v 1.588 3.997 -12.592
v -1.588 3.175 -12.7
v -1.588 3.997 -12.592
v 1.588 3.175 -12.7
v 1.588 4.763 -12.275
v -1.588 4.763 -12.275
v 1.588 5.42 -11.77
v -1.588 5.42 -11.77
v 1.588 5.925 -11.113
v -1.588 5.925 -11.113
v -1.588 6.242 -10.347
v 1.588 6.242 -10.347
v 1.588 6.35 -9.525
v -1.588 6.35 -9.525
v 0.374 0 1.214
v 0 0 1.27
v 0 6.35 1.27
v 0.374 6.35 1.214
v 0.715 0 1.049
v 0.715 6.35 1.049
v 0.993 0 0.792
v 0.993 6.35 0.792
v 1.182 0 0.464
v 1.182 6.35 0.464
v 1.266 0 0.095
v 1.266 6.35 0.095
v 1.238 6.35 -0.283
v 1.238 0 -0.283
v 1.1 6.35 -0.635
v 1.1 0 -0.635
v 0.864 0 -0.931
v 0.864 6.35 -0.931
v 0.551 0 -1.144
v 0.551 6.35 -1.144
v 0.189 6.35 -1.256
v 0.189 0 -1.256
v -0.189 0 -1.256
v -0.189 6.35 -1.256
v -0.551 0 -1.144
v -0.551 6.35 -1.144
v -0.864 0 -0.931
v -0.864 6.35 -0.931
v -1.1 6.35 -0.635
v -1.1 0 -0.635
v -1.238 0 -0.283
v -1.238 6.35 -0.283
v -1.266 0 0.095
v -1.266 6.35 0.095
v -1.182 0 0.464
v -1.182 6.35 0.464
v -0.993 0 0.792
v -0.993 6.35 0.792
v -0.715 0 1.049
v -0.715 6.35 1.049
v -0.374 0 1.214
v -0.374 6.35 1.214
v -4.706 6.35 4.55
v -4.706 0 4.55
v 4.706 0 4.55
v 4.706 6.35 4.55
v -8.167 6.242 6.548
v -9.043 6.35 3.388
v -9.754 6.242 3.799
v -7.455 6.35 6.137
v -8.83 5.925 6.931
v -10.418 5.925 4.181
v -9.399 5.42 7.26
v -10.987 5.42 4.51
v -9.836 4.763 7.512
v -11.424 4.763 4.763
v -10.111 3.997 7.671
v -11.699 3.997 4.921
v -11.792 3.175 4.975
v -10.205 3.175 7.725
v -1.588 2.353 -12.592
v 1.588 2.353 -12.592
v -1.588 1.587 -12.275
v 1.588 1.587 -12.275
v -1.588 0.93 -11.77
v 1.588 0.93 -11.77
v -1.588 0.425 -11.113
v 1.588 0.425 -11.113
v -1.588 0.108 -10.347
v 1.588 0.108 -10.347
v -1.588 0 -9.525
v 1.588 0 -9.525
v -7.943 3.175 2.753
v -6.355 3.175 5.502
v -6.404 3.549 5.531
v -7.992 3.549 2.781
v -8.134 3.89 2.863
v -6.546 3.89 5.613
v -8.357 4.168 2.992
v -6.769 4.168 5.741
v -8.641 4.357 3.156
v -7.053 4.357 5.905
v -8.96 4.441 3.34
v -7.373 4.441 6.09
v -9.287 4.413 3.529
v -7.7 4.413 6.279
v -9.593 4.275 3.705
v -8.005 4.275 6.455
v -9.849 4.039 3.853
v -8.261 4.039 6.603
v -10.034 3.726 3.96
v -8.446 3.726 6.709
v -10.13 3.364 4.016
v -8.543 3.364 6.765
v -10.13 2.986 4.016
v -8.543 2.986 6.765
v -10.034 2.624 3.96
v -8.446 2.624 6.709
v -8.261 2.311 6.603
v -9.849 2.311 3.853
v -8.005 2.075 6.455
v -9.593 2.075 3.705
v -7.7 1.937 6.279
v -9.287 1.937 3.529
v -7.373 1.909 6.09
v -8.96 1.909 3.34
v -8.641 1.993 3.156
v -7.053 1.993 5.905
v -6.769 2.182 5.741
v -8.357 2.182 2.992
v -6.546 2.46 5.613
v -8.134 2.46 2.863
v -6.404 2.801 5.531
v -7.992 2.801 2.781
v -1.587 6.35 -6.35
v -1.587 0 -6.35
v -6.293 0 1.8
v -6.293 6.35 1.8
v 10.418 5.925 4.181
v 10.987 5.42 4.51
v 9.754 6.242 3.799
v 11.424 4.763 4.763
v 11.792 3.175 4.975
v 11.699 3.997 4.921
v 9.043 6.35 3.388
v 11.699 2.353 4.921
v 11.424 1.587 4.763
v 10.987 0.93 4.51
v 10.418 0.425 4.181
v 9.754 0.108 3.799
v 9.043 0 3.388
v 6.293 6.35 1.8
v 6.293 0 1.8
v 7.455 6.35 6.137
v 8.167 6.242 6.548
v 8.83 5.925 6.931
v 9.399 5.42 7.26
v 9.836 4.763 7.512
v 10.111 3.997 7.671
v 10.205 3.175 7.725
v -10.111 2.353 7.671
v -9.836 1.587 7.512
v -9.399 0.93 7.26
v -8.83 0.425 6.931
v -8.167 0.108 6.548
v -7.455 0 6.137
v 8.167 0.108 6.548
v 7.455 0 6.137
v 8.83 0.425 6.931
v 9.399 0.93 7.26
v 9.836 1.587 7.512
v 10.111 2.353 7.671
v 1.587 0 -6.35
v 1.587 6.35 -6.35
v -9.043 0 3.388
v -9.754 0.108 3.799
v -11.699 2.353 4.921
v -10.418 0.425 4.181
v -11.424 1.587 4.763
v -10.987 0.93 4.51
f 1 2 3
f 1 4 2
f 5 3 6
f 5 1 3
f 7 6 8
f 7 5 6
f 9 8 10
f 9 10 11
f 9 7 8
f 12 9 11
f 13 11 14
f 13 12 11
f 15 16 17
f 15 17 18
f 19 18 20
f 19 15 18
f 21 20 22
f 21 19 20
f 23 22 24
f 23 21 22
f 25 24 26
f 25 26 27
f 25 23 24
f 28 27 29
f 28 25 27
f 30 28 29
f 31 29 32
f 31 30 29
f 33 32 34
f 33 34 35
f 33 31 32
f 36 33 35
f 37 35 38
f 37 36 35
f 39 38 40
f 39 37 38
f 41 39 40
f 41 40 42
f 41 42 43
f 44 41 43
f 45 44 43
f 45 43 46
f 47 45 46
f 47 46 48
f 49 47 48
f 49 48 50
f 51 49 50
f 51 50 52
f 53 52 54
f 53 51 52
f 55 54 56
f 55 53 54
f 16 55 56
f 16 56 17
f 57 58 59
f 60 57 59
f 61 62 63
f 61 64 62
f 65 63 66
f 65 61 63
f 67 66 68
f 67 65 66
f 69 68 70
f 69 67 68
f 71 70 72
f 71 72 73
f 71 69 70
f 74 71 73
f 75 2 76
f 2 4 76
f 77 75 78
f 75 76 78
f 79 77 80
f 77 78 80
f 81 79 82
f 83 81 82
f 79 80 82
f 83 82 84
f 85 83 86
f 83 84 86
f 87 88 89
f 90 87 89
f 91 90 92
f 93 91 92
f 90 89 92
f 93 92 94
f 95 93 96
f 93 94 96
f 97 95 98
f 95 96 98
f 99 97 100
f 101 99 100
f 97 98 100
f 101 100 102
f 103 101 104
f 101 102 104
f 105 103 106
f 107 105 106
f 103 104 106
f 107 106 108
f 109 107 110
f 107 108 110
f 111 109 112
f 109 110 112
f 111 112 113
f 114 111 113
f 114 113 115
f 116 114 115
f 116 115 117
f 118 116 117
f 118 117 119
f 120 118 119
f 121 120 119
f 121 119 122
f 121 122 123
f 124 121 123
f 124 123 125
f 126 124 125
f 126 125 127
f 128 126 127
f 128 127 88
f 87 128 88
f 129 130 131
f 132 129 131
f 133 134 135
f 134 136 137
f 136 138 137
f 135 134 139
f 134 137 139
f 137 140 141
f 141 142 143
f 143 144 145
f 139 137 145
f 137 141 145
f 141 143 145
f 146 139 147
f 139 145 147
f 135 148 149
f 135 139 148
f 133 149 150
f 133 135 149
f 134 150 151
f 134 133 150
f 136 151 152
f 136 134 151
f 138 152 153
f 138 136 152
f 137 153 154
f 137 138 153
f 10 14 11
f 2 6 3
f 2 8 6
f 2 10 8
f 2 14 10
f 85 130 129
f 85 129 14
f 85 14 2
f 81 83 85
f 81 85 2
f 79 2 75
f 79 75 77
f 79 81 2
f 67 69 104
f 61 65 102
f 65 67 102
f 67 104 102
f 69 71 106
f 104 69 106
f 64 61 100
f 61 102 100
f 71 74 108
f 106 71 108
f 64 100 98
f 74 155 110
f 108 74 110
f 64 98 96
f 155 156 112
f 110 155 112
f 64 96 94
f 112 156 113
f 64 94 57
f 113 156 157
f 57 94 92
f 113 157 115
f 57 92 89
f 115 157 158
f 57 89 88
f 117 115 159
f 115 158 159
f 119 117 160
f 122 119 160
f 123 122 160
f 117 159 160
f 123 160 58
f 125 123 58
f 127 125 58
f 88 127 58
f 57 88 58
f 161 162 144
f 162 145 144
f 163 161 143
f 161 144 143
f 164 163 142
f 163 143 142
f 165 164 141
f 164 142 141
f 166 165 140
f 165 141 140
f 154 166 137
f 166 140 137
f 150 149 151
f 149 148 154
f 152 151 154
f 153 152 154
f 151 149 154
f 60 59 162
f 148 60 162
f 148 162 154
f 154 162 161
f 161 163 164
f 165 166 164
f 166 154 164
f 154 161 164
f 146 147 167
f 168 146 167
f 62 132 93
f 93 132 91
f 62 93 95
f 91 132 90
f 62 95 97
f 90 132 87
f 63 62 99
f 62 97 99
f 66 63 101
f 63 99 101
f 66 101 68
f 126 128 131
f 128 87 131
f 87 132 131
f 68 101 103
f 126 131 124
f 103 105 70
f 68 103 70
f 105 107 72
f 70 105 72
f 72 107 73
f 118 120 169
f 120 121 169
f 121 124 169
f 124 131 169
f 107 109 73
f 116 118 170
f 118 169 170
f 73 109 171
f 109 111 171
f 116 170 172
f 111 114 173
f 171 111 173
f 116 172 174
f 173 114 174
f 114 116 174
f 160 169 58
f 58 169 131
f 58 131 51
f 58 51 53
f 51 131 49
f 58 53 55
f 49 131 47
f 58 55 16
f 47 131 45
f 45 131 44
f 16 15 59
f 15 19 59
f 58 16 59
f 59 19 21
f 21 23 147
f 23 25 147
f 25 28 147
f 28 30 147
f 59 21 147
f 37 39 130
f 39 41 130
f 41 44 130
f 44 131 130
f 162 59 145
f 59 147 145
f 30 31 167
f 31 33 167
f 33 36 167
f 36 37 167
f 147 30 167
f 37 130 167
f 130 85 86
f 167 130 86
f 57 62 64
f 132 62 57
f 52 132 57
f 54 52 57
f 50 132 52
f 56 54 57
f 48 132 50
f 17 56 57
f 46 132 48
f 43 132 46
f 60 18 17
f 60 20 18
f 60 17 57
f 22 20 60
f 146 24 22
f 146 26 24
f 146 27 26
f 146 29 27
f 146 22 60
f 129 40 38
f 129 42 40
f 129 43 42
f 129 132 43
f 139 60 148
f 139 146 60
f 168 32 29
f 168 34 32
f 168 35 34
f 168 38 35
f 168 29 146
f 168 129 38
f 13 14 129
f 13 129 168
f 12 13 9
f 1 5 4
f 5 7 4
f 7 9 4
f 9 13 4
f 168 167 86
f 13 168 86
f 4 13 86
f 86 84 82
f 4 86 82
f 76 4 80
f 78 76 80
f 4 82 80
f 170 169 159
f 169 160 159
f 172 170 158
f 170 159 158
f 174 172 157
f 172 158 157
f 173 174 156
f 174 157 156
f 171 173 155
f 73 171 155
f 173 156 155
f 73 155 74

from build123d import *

# Parameters (mm, degrees)
SKETCH1_R           = 1.27
SKETCH1_W           = 3.175
SKETCH1_H           = 6.35
BOSS_EXTRUDE1_DEPTH = 6.35
CUT_EXTRUDE1_REACH  = 21.921
SKETCH2_R           = 1.27
FILLET1_R           = 3.175


with BuildPart() as part:
    # Sketch1 → Boss-Extrude1 (new body)
    # profile 1 of 4: a face of its own
    with BuildSketch(Plane(origin=(0, 0, 0), x_dir=(1, 0, 0), z_dir=(0, 1, 0))):
        Polygon((4.705511314, -4.549815329), (6.293011314, -1.800184671), (1.5875, 6.35), (-1.5875, 6.35), (-6.293011314, -1.800184671), (-4.705511314, -4.549815329), align=None)
        with Locations(Location((0, 0, 0), (0, 0, 270))):
            Circle(SKETCH1_R, mode=Mode.SUBTRACT)
    # profile 2 of 4: a face of its own
    with BuildSketch(Plane(origin=(0, 0, 0), x_dir=(1, 0, 0), z_dir=(0, 1, 0))):
        Polygon((-11.792272628, -4.975184671), (-10.204772628, -7.724815329), (-4.705511314, -4.549815329), (-6.293011314, -1.800184671), align=None)
    # profile 3 of 4: a face of its own
    with BuildSketch(Plane(origin=(0, 0, 0), x_dir=(1, 0, 0), z_dir=(0, 1, 0))):
        Polygon((10.204772628, -7.724815329), (11.792272628, -4.975184671), (6.293011314, -1.800184671), (4.705511314, -4.549815329), align=None)
    # profile 4 of 4: a face of its own
    with BuildSketch(Plane(origin=(0, 0, 0), x_dir=(1, 0, 0), z_dir=(0, 1, 0))):
        with Locations((0, 9.525)):
            Rectangle(SKETCH1_W, SKETCH1_H)
    extrude(amount=BOSS_EXTRUDE1_DEPTH)

    # Sketch2 → Cut-Extrude1 (cut, up to next)
    with BuildSketch(Plane(origin=(0.79375, 0, 1.374815329), x_dir=(0.8660254037844384, 0, -0.5000000000000006), z_dir=(0.5000000000000006, 0, 0.8660254037844384)), mode=Mode.PRIVATE) as cut_extrude1_sk1:
        with Locations((-9.525, 3.175)):
            Circle(SKETCH2_R)
    cut_extrude1_tool1 = extrude(cut_extrude1_sk1.sketch, amount=-CUT_EXTRUDE1_REACH, mode=Mode.PRIVATE) & part.part
    add(cut_extrude1_tool1.solids().sort_by_distance((-7.455142, 3.175, 6.137315))[0], mode=Mode.SUBTRACT)

    # Fillet1
    fillet1_edges = [part.edges().sort_by_distance(p)[0] for p in [
        (0, 0, -12.7),
        (0, 6.35, -12.7),
        (10.998522628, 0, 6.35),
        (10.998522628, 6.35, 6.35),
        (-10.998522628, 0, 6.35),
        (-10.998522628, 6.35, 6.35),
    ]]
    fillet(fillet1_edges, radius=FILLET1_R - 0.0001)  # a hair under: the kernel refuses the full size


solid = part.part
